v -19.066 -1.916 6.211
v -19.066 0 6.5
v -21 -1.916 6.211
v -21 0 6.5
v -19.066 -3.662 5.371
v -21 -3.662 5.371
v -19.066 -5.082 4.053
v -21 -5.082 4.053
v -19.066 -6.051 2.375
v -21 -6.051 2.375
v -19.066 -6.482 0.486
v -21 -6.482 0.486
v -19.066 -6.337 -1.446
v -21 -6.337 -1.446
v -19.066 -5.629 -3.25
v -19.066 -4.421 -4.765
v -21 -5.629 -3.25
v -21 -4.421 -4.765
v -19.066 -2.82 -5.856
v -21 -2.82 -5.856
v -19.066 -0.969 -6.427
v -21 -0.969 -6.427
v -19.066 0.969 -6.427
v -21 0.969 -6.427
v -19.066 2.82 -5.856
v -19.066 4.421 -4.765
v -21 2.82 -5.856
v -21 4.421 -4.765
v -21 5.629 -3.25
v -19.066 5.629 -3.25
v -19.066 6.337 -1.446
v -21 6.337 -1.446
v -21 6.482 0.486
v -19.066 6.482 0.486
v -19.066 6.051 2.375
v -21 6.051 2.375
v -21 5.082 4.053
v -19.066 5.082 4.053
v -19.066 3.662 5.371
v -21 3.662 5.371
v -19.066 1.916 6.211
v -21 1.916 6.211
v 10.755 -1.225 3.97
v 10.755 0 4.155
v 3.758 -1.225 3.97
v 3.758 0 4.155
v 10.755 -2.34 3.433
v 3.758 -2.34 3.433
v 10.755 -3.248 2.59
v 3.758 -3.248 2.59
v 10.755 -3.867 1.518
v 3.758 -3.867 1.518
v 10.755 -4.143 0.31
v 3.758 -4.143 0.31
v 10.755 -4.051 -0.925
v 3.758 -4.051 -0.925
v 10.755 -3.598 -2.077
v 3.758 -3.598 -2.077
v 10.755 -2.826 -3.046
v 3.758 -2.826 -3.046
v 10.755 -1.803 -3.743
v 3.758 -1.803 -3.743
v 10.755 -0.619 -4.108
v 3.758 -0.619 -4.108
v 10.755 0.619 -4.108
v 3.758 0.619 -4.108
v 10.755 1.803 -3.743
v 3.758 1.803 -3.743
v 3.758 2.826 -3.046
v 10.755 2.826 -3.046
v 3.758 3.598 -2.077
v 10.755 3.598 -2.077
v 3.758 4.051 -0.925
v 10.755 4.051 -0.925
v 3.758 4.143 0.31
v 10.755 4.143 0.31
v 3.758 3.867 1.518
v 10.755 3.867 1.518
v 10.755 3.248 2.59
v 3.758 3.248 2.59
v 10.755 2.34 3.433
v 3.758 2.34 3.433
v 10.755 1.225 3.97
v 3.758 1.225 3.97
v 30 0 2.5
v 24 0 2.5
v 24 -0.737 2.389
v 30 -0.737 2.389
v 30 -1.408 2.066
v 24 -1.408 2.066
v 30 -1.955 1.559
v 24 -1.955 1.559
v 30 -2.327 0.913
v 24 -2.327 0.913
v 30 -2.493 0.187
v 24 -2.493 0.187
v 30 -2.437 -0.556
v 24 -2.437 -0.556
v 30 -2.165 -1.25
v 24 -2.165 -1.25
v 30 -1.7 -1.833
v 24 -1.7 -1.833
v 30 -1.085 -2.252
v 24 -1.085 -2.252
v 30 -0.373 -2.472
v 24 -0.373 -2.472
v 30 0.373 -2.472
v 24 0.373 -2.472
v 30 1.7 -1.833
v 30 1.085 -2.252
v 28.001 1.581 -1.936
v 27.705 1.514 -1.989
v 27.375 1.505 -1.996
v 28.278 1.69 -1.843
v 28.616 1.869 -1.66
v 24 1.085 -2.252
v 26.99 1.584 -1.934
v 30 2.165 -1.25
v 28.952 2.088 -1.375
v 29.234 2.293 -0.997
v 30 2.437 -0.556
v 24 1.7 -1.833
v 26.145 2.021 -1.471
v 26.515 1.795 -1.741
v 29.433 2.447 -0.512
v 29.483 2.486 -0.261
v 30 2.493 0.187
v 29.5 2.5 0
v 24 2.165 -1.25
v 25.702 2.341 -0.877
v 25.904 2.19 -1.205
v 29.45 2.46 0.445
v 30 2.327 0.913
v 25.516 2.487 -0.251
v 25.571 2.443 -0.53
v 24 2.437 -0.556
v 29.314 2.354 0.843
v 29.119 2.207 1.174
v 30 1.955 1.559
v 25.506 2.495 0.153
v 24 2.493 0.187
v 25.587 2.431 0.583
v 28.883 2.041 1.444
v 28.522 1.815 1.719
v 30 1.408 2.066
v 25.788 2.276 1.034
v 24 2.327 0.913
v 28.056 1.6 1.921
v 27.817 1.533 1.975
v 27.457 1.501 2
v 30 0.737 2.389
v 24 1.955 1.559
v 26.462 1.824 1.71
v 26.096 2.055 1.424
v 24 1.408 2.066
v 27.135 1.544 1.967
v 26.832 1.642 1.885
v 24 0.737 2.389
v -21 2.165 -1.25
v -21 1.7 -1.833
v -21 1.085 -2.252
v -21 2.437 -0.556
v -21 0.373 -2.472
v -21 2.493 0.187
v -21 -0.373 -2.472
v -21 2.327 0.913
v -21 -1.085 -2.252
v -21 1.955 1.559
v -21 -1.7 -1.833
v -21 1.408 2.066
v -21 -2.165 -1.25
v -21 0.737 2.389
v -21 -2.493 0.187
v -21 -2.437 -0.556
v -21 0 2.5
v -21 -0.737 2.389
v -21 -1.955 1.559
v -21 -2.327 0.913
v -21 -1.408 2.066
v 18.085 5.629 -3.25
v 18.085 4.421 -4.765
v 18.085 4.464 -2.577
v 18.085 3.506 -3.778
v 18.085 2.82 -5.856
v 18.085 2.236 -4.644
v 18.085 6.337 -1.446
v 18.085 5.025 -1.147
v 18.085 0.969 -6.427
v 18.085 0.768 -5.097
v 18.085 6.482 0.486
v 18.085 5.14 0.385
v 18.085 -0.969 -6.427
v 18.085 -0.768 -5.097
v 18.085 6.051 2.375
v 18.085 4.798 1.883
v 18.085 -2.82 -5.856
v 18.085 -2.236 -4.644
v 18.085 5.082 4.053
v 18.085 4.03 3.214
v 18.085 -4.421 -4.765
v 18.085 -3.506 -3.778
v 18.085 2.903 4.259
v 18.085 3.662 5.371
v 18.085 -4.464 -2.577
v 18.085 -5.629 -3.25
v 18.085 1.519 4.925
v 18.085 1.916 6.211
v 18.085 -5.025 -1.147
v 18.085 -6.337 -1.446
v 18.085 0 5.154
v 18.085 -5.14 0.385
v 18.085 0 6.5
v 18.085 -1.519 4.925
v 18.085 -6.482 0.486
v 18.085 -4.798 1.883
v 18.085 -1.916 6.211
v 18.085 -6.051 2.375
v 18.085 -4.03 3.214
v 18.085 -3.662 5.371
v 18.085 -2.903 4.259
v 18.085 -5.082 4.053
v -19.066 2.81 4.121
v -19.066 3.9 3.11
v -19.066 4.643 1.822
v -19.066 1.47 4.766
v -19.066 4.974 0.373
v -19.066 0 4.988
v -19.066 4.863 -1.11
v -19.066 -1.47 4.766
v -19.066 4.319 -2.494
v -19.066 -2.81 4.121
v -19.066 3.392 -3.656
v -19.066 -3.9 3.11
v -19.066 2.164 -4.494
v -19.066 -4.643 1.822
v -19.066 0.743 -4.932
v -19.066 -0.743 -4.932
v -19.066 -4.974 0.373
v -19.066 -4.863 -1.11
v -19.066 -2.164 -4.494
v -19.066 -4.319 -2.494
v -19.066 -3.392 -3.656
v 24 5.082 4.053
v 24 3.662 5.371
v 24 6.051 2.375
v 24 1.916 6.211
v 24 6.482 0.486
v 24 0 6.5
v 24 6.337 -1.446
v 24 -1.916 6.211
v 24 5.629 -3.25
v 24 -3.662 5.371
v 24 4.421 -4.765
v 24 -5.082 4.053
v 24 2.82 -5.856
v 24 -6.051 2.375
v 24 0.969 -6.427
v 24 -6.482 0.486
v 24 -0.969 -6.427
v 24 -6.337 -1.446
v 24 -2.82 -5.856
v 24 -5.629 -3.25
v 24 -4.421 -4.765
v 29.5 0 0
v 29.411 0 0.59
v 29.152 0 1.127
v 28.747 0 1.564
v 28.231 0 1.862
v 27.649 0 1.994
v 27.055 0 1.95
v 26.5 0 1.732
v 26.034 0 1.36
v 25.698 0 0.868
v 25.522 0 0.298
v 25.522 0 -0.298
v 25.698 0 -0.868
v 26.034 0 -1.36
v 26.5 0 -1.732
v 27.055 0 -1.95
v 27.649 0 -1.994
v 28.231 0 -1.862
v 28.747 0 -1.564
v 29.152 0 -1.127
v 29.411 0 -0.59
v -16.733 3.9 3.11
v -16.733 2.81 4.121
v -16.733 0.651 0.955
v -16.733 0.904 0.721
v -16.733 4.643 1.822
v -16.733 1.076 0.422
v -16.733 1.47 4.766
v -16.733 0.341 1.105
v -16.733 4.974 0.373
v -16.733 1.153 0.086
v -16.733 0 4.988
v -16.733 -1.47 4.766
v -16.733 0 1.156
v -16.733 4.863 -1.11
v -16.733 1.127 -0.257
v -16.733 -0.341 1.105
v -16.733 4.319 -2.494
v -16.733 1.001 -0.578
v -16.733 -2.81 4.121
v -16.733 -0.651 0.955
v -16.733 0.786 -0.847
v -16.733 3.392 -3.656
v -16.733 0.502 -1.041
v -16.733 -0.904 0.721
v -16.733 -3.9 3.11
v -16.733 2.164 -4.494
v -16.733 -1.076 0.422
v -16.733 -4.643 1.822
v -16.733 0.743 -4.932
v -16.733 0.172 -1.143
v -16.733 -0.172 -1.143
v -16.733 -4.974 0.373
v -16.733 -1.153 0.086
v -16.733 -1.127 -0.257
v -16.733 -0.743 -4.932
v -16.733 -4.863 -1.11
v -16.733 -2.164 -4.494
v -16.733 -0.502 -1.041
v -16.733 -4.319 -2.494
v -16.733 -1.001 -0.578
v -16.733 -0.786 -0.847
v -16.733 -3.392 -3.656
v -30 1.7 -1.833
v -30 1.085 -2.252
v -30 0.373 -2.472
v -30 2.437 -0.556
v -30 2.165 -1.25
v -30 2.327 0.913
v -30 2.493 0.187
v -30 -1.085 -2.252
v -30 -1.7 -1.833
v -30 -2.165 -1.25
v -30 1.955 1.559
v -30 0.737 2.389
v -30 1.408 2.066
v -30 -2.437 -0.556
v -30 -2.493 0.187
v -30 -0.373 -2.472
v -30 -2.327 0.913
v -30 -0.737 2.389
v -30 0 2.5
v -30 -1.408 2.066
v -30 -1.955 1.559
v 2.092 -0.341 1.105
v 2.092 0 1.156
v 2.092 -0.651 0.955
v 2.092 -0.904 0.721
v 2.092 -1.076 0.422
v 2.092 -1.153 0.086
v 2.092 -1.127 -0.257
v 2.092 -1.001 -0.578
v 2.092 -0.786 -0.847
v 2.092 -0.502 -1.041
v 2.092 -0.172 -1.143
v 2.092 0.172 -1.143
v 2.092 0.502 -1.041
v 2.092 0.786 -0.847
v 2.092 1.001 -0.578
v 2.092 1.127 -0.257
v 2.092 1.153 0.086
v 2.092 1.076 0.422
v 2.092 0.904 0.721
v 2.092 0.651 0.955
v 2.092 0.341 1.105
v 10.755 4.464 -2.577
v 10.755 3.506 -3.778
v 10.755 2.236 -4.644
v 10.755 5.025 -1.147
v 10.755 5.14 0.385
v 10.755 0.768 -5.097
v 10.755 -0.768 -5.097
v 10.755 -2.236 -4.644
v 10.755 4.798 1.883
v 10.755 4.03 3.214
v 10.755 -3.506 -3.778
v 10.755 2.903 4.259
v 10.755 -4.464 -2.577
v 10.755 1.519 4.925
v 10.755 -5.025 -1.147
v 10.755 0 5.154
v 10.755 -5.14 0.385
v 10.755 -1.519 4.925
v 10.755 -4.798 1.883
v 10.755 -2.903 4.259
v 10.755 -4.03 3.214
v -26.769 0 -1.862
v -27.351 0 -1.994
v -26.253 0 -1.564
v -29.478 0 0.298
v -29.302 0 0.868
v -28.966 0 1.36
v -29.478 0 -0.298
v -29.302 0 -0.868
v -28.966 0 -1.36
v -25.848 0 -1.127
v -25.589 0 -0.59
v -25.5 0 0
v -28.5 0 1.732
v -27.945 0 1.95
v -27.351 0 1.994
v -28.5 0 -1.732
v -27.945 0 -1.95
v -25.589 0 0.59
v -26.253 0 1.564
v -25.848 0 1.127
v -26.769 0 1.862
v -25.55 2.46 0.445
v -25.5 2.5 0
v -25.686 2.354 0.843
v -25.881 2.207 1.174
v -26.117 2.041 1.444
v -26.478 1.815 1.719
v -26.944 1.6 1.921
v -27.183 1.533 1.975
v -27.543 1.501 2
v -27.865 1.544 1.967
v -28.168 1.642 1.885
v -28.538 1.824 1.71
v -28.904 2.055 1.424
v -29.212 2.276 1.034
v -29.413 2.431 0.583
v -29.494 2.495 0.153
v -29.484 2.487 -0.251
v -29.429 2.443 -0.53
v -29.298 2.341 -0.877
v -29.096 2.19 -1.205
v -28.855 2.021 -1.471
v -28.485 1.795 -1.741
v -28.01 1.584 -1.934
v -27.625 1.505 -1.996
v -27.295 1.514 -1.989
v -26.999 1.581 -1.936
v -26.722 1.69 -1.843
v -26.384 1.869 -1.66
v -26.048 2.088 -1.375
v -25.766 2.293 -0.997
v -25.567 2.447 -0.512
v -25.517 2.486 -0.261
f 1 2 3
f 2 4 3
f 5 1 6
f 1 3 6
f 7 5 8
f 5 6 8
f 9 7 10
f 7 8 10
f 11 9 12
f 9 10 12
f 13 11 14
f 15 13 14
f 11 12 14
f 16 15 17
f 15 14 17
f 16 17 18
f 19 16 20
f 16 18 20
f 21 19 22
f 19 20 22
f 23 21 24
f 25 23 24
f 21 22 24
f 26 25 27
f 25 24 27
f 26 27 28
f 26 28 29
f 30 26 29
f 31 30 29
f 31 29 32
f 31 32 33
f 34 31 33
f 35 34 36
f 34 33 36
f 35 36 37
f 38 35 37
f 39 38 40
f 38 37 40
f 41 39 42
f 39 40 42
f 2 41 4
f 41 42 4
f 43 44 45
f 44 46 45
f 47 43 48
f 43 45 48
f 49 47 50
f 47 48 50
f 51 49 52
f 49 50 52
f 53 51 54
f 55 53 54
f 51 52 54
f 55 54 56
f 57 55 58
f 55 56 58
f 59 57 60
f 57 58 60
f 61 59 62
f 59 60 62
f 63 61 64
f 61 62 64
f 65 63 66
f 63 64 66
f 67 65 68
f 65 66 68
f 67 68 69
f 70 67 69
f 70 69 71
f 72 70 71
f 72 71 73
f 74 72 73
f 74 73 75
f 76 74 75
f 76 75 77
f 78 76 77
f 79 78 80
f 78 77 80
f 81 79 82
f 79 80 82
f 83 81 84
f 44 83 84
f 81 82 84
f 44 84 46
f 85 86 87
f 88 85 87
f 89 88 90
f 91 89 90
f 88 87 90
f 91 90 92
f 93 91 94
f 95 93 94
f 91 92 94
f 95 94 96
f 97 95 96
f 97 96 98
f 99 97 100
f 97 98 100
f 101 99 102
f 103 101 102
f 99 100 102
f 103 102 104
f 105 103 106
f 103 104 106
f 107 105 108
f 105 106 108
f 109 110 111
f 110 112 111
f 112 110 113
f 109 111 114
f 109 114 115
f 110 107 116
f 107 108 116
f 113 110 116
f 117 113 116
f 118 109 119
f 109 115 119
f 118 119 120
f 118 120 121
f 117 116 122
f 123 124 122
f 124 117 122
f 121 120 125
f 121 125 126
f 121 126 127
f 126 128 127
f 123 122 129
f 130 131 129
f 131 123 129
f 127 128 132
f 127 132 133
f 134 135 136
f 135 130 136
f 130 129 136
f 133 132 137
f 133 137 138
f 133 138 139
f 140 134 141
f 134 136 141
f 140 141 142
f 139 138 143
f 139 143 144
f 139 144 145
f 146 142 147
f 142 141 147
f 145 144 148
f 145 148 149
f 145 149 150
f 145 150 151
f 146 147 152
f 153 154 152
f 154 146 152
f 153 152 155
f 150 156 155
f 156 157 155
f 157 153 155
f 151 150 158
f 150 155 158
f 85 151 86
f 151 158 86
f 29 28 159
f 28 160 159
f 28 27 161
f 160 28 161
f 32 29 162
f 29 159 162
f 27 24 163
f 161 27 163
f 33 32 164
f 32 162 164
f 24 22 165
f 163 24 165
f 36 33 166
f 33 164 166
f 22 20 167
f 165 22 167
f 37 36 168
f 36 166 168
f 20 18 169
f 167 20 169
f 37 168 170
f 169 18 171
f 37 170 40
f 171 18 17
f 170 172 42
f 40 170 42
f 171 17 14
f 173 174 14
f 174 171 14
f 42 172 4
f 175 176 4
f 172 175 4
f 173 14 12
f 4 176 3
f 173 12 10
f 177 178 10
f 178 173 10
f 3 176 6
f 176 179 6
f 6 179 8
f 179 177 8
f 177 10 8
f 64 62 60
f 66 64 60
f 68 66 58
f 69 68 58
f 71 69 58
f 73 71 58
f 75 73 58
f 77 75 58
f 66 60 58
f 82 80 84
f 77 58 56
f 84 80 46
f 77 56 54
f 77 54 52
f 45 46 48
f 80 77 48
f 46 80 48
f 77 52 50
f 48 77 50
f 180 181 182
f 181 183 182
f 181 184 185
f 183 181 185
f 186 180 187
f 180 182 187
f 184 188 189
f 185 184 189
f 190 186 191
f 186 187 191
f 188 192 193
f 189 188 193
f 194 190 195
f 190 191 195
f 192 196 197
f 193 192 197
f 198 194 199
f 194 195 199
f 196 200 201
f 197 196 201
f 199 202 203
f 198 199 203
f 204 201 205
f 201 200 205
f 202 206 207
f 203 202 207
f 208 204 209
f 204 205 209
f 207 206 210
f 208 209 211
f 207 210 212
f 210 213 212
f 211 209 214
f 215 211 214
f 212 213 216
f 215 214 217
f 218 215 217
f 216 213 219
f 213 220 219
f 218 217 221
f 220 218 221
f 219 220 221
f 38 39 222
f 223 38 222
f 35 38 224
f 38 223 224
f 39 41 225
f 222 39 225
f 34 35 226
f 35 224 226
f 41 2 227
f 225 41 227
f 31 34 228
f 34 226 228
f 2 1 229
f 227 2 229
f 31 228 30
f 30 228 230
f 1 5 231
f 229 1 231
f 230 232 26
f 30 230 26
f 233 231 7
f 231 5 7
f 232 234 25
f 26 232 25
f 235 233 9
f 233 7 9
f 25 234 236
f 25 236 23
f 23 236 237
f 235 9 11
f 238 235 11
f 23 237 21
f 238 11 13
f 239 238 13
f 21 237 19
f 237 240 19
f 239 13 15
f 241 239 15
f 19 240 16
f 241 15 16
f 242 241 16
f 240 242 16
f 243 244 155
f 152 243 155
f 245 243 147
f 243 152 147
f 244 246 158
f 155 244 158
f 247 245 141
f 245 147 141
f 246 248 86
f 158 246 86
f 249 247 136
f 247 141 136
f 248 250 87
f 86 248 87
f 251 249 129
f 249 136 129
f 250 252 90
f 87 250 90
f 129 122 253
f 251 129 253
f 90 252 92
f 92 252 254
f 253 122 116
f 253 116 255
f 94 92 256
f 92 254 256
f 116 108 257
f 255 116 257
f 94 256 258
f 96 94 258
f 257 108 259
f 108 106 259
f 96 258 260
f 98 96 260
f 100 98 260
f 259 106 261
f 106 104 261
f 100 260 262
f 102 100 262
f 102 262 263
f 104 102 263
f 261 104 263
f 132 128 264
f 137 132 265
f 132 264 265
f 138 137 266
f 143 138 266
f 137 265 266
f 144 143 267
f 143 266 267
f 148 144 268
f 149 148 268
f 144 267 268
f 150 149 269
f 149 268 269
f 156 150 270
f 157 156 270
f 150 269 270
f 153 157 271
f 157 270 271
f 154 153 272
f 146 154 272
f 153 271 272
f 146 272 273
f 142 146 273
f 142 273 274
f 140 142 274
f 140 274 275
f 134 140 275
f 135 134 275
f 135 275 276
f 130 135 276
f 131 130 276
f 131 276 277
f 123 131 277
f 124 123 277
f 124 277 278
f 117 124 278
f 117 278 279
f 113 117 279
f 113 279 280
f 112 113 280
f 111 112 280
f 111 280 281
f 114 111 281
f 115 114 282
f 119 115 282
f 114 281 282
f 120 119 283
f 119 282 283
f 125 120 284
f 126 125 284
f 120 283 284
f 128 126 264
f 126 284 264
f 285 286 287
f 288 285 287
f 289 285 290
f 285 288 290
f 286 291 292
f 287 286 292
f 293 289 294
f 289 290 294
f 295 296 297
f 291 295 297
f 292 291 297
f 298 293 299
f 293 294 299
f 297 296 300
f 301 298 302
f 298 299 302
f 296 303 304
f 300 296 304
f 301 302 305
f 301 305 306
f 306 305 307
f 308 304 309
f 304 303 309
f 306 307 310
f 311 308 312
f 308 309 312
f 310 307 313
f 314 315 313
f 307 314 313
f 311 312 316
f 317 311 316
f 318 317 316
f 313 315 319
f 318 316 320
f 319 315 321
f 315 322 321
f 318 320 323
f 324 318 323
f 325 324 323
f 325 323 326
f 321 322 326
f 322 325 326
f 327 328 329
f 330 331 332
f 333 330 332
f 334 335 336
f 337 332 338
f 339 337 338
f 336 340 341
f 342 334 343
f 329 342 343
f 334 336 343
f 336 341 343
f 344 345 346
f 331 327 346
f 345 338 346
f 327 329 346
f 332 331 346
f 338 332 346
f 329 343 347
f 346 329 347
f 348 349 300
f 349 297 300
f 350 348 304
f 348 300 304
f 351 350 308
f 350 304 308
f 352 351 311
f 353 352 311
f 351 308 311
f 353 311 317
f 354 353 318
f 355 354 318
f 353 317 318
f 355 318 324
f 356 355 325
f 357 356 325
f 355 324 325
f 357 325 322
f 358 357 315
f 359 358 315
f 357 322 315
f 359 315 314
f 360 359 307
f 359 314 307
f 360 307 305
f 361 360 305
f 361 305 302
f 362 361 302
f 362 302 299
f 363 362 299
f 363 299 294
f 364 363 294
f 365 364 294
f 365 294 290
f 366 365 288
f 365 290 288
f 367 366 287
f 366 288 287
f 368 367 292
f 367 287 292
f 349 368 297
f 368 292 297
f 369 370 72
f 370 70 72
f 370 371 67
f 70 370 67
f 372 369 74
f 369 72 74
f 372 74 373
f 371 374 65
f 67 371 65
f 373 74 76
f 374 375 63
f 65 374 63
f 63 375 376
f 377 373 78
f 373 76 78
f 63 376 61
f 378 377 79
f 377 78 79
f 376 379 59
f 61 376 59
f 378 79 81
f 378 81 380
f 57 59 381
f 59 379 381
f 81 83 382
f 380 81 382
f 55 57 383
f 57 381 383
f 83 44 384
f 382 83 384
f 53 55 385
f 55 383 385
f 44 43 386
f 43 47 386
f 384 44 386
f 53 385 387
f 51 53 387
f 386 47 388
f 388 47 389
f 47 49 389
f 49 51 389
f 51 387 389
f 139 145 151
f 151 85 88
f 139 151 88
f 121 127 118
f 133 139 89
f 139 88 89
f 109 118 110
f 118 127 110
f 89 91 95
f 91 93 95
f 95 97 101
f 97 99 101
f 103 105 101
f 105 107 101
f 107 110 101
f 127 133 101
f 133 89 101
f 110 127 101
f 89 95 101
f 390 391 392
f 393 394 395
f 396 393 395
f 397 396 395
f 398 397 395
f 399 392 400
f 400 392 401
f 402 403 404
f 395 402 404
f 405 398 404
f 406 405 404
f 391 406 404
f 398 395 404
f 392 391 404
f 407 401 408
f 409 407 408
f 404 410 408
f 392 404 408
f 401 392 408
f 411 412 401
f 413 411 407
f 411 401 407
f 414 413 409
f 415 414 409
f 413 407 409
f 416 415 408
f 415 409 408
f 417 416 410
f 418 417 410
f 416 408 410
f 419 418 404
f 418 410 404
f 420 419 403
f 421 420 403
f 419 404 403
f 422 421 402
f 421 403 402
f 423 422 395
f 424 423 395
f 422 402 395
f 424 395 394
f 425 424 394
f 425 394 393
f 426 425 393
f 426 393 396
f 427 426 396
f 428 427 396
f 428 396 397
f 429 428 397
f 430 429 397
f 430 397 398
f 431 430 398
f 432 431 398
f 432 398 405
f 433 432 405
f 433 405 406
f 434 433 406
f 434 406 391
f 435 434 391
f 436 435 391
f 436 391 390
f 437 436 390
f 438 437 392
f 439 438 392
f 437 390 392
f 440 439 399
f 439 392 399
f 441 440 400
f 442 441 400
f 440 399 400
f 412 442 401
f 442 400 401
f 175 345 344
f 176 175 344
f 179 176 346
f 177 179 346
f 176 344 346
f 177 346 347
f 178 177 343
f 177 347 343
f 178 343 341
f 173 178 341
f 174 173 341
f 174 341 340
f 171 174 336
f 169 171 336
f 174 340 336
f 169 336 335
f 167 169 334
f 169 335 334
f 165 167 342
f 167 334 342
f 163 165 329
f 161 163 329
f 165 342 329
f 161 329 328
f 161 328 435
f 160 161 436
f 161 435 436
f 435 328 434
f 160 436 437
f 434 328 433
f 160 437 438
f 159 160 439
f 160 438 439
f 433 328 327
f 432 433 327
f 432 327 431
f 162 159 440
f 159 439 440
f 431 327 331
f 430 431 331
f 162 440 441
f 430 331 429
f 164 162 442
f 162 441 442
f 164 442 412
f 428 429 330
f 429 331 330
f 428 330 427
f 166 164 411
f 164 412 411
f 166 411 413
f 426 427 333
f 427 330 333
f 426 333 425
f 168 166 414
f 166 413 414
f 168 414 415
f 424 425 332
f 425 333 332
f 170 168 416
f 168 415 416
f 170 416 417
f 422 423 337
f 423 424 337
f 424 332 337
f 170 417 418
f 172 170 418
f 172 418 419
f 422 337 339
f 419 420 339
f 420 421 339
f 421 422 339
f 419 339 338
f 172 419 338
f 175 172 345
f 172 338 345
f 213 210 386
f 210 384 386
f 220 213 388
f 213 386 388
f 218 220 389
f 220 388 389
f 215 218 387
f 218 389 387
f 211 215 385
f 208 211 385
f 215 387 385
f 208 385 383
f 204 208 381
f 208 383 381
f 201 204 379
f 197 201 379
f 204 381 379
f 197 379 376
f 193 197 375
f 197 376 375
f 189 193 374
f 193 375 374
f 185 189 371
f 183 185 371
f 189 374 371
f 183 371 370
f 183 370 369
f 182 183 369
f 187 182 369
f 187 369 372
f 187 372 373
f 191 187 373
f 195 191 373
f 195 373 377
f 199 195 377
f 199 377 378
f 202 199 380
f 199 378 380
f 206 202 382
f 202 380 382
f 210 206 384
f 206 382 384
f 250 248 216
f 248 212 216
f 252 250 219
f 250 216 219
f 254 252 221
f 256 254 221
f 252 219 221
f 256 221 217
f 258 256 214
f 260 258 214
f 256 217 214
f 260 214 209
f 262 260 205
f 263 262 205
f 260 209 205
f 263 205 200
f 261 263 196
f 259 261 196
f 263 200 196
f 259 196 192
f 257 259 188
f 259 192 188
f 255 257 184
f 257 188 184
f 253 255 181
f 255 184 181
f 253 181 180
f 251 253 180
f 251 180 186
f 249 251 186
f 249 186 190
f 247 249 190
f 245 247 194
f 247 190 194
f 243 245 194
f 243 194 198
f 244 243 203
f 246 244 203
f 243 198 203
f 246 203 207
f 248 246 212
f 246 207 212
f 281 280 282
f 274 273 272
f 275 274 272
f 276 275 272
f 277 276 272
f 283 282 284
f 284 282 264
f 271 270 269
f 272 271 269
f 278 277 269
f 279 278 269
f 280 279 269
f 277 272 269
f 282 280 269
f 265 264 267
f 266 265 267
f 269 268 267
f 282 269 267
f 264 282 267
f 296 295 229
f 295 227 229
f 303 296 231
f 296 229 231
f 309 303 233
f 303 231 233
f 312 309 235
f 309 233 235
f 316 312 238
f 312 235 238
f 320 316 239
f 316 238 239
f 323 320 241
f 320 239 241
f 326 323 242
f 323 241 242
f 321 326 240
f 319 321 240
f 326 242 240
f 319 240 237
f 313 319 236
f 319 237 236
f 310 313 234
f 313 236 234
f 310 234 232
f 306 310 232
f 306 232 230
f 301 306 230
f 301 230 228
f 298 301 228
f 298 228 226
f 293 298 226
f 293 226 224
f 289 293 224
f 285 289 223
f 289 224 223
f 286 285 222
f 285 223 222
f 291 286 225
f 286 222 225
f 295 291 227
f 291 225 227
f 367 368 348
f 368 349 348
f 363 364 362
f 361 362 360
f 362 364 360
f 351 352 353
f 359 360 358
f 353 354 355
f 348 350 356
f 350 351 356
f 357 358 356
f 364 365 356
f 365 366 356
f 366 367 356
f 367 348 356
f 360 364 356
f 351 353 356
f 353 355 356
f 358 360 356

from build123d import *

# Parameters (mm, degrees)
F2_R     = 2
F3_DEPTH = 6.501


with BuildPart() as f1:
    # F0 (on Front) → F1 (revolve)
    with BuildSketch(Plane.XZ):
        Polygon((-30, 2.5), (-30, 0), (2.092156, 0), (2.092156, 1.155926), (-16.733287, 1.155926), (-16.733287, 4.987653), (-19.065645, 4.987653), (-19.065645, 6.5), (-21, 6.5), (-21, 2.5), align=None)
        Polygon((30, 0), (30, 2.5), (24, 2.5), (24, 6.5), (18.085454, 6.5), (18.085454, 5.15425), (10.755192, 5.15425), (10.755192, 4.154669), (3.758125, 4.154669), (3.758125, 0), align=None)
    revolve(axis=Axis((-13.953922, 0, 0), (1, 0, 0)))

    # F2 (on Front) → F3 (cut, through all)
    with BuildSketch(Plane.XZ):
        with Locations((27.5, 0)):
            Circle(F2_R)
        with Locations((-27.5, 0)):
            Circle(F2_R)
    extrude(amount=-F3_DEPTH, mode=Mode.SUBTRACT)


solid = f1.part
